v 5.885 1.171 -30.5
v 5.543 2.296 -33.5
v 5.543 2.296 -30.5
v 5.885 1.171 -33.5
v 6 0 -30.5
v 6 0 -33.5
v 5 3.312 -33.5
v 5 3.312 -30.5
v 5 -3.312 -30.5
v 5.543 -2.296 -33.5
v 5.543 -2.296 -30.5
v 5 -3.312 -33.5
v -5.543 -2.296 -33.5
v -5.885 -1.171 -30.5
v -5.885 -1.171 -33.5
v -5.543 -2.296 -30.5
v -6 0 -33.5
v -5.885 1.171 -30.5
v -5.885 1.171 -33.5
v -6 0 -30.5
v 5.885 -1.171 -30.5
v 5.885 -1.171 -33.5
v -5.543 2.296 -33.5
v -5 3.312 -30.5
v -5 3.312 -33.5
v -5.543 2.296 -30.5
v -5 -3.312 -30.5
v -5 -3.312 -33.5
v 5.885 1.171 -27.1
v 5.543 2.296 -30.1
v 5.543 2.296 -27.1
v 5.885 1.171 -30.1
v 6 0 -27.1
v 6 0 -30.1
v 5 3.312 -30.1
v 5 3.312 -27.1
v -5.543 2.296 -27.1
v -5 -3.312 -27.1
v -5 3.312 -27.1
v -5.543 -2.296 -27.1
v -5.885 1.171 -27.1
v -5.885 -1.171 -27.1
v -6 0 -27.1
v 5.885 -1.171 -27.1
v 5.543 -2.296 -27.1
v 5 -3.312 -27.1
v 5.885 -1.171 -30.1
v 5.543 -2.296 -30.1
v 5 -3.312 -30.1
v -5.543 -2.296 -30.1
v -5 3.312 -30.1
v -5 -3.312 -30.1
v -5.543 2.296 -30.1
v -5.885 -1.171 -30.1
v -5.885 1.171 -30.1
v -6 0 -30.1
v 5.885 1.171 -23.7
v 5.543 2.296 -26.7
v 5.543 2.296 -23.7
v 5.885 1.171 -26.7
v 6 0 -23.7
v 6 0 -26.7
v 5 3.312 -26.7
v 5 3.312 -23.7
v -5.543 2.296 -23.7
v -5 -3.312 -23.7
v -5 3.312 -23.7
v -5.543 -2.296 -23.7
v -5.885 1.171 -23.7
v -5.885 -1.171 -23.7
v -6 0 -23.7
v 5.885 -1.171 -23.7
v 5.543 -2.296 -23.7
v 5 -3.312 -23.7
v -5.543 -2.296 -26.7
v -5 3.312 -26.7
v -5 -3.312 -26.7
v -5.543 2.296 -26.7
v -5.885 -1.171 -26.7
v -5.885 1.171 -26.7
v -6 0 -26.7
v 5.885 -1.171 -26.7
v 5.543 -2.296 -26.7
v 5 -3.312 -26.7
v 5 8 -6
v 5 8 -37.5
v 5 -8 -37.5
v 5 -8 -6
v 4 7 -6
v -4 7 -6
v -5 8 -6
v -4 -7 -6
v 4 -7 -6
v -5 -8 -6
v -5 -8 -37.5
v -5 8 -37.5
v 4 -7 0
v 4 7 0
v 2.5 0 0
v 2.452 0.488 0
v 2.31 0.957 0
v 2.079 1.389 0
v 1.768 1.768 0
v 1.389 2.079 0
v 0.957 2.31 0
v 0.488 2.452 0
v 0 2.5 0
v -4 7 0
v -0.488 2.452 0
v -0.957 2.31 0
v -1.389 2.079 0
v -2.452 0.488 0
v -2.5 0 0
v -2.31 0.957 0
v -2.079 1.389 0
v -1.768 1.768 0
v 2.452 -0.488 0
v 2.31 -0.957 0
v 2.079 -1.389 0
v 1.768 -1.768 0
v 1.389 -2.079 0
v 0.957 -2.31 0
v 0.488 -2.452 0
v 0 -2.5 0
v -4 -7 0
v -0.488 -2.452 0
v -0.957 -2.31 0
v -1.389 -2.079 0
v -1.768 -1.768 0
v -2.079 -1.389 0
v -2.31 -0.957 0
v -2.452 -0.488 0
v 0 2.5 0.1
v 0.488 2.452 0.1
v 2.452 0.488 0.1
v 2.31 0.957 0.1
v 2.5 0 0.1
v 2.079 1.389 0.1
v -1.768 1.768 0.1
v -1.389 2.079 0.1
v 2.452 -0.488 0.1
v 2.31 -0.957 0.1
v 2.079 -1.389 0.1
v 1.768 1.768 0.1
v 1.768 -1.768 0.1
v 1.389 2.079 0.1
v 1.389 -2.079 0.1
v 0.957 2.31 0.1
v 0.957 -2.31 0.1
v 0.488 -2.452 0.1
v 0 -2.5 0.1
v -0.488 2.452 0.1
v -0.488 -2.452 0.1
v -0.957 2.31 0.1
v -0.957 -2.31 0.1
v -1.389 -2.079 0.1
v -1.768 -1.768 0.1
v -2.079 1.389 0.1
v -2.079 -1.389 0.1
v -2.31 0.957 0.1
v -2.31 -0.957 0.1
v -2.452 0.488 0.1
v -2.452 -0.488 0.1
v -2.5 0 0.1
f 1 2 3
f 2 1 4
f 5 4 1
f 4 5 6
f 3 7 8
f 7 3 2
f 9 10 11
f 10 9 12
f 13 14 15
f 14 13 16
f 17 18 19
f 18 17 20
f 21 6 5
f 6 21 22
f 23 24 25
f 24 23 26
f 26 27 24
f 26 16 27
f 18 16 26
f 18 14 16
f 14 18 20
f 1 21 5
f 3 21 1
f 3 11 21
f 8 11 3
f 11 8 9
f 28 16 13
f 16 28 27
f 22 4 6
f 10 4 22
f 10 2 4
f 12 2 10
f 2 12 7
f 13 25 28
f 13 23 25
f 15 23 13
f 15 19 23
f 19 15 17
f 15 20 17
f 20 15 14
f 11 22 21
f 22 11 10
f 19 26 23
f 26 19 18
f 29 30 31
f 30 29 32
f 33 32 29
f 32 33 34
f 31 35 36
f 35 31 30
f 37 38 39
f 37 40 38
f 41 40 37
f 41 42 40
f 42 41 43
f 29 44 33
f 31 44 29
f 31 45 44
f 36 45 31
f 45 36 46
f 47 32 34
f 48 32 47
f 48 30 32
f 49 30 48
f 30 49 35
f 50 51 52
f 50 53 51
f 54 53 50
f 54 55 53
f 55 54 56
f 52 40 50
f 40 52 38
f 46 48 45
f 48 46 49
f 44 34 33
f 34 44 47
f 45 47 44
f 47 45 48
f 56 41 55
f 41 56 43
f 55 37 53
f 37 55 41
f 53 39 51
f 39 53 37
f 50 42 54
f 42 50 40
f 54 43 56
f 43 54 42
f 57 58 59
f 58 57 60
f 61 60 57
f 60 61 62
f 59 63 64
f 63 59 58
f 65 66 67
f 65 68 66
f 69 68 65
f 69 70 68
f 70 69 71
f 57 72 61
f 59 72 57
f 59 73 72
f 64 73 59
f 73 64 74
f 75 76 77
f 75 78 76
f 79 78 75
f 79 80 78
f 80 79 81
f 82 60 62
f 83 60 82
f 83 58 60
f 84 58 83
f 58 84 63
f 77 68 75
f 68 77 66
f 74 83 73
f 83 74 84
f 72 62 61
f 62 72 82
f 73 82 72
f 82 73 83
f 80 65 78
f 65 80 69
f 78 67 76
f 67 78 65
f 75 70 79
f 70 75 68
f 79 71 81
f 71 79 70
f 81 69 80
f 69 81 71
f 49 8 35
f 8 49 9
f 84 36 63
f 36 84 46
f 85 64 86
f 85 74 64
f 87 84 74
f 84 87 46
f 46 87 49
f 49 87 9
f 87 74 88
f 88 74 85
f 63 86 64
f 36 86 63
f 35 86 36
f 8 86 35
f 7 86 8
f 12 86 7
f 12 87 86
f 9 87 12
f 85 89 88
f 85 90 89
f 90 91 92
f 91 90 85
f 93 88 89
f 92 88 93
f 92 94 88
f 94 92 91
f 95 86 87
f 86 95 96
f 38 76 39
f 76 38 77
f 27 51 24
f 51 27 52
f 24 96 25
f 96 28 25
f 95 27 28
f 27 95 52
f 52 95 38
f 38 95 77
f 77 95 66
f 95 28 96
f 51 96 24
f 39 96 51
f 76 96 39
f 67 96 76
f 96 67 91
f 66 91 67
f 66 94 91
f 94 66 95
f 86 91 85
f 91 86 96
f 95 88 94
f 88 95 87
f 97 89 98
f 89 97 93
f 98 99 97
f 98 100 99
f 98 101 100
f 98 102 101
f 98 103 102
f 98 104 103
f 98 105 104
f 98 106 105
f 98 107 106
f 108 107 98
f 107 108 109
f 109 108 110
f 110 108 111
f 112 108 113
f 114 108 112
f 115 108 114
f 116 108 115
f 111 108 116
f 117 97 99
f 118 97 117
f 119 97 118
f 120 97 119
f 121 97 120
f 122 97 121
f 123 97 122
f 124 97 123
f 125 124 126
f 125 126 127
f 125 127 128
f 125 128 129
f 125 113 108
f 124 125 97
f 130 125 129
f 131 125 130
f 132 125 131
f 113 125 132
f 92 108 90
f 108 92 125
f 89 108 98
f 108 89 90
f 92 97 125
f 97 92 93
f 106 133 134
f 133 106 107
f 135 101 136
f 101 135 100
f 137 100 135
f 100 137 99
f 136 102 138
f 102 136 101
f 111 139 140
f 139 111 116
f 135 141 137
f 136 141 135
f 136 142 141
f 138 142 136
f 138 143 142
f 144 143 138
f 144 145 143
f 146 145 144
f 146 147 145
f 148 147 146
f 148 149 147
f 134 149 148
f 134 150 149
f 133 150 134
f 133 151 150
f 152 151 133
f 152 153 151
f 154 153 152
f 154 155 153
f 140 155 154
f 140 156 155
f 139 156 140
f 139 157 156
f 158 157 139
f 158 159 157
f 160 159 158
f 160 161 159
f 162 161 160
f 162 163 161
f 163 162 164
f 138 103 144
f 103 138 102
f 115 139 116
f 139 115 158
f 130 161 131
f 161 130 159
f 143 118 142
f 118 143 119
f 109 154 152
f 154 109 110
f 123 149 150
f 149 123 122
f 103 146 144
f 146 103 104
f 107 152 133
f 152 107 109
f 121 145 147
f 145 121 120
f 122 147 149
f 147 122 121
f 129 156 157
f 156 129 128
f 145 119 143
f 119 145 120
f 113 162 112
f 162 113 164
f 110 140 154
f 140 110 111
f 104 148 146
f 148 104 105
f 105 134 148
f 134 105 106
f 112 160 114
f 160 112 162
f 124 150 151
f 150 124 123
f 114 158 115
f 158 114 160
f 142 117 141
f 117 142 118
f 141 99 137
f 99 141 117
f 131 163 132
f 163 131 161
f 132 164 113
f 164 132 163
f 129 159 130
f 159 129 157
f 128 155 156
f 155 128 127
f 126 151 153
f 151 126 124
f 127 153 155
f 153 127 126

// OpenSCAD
// ============================================================================
// led_module_001.scad — Mock module LED móc khoá (MUA SẴN — không in)
// ----------------------------------------------------------------------------
// Cả module = "1 bóng" (1 đơn vị sáng): 37.5 × 10 × 16 mm, LED ở ĐẦU MŨI,
// 3 pin cúc trong thân. Dựng ĐỨNG, đầu LED hướng LÊN (G1 "LED xuôi").
// Cắm-tháo bằng ma sát qua lỗ vách đỡ (không keo).
// Gốc cục bộ: TÂM ĐẦU LED (đỉnh module) = [0,0,0], thân xuống −Z.
// ============================================================================
include <../constants.scad>

module led_module() {
    // Thân module (hộp), đỉnh tại z=0
    color(col_led) translate([-led_mod_w/2, -led_mod_d/2, -led_mod_h])
        cube([led_mod_w, led_mod_d, led_mod_h - led_head_h]);
    // Đầu mũi chứa LED (thu nhỏ nhẹ)
    color([1, 1, 0.85]) translate([-led_mod_w/2 + 1, -led_mod_d/2 + 1, -led_head_h])
        cube([led_mod_w - 2, led_mod_d - 2, led_head_h]);
    // Chấm LED phát sáng trên đỉnh
    color([1, 1, 0.6]) translate([0, 0, -0.5]) cylinder(d = 5, h = 0.6, $fn = 32);
    // Gợi khối 3 pin cúc ở nửa dưới
    color(col_metal) translate([0, 0, -led_mod_h + 4])
        for (i = [0:2]) translate([0, 0, i * 3.4]) cylinder(d = led_mod_d - 4, h = 3, $fn = 32);
}

led_module();
